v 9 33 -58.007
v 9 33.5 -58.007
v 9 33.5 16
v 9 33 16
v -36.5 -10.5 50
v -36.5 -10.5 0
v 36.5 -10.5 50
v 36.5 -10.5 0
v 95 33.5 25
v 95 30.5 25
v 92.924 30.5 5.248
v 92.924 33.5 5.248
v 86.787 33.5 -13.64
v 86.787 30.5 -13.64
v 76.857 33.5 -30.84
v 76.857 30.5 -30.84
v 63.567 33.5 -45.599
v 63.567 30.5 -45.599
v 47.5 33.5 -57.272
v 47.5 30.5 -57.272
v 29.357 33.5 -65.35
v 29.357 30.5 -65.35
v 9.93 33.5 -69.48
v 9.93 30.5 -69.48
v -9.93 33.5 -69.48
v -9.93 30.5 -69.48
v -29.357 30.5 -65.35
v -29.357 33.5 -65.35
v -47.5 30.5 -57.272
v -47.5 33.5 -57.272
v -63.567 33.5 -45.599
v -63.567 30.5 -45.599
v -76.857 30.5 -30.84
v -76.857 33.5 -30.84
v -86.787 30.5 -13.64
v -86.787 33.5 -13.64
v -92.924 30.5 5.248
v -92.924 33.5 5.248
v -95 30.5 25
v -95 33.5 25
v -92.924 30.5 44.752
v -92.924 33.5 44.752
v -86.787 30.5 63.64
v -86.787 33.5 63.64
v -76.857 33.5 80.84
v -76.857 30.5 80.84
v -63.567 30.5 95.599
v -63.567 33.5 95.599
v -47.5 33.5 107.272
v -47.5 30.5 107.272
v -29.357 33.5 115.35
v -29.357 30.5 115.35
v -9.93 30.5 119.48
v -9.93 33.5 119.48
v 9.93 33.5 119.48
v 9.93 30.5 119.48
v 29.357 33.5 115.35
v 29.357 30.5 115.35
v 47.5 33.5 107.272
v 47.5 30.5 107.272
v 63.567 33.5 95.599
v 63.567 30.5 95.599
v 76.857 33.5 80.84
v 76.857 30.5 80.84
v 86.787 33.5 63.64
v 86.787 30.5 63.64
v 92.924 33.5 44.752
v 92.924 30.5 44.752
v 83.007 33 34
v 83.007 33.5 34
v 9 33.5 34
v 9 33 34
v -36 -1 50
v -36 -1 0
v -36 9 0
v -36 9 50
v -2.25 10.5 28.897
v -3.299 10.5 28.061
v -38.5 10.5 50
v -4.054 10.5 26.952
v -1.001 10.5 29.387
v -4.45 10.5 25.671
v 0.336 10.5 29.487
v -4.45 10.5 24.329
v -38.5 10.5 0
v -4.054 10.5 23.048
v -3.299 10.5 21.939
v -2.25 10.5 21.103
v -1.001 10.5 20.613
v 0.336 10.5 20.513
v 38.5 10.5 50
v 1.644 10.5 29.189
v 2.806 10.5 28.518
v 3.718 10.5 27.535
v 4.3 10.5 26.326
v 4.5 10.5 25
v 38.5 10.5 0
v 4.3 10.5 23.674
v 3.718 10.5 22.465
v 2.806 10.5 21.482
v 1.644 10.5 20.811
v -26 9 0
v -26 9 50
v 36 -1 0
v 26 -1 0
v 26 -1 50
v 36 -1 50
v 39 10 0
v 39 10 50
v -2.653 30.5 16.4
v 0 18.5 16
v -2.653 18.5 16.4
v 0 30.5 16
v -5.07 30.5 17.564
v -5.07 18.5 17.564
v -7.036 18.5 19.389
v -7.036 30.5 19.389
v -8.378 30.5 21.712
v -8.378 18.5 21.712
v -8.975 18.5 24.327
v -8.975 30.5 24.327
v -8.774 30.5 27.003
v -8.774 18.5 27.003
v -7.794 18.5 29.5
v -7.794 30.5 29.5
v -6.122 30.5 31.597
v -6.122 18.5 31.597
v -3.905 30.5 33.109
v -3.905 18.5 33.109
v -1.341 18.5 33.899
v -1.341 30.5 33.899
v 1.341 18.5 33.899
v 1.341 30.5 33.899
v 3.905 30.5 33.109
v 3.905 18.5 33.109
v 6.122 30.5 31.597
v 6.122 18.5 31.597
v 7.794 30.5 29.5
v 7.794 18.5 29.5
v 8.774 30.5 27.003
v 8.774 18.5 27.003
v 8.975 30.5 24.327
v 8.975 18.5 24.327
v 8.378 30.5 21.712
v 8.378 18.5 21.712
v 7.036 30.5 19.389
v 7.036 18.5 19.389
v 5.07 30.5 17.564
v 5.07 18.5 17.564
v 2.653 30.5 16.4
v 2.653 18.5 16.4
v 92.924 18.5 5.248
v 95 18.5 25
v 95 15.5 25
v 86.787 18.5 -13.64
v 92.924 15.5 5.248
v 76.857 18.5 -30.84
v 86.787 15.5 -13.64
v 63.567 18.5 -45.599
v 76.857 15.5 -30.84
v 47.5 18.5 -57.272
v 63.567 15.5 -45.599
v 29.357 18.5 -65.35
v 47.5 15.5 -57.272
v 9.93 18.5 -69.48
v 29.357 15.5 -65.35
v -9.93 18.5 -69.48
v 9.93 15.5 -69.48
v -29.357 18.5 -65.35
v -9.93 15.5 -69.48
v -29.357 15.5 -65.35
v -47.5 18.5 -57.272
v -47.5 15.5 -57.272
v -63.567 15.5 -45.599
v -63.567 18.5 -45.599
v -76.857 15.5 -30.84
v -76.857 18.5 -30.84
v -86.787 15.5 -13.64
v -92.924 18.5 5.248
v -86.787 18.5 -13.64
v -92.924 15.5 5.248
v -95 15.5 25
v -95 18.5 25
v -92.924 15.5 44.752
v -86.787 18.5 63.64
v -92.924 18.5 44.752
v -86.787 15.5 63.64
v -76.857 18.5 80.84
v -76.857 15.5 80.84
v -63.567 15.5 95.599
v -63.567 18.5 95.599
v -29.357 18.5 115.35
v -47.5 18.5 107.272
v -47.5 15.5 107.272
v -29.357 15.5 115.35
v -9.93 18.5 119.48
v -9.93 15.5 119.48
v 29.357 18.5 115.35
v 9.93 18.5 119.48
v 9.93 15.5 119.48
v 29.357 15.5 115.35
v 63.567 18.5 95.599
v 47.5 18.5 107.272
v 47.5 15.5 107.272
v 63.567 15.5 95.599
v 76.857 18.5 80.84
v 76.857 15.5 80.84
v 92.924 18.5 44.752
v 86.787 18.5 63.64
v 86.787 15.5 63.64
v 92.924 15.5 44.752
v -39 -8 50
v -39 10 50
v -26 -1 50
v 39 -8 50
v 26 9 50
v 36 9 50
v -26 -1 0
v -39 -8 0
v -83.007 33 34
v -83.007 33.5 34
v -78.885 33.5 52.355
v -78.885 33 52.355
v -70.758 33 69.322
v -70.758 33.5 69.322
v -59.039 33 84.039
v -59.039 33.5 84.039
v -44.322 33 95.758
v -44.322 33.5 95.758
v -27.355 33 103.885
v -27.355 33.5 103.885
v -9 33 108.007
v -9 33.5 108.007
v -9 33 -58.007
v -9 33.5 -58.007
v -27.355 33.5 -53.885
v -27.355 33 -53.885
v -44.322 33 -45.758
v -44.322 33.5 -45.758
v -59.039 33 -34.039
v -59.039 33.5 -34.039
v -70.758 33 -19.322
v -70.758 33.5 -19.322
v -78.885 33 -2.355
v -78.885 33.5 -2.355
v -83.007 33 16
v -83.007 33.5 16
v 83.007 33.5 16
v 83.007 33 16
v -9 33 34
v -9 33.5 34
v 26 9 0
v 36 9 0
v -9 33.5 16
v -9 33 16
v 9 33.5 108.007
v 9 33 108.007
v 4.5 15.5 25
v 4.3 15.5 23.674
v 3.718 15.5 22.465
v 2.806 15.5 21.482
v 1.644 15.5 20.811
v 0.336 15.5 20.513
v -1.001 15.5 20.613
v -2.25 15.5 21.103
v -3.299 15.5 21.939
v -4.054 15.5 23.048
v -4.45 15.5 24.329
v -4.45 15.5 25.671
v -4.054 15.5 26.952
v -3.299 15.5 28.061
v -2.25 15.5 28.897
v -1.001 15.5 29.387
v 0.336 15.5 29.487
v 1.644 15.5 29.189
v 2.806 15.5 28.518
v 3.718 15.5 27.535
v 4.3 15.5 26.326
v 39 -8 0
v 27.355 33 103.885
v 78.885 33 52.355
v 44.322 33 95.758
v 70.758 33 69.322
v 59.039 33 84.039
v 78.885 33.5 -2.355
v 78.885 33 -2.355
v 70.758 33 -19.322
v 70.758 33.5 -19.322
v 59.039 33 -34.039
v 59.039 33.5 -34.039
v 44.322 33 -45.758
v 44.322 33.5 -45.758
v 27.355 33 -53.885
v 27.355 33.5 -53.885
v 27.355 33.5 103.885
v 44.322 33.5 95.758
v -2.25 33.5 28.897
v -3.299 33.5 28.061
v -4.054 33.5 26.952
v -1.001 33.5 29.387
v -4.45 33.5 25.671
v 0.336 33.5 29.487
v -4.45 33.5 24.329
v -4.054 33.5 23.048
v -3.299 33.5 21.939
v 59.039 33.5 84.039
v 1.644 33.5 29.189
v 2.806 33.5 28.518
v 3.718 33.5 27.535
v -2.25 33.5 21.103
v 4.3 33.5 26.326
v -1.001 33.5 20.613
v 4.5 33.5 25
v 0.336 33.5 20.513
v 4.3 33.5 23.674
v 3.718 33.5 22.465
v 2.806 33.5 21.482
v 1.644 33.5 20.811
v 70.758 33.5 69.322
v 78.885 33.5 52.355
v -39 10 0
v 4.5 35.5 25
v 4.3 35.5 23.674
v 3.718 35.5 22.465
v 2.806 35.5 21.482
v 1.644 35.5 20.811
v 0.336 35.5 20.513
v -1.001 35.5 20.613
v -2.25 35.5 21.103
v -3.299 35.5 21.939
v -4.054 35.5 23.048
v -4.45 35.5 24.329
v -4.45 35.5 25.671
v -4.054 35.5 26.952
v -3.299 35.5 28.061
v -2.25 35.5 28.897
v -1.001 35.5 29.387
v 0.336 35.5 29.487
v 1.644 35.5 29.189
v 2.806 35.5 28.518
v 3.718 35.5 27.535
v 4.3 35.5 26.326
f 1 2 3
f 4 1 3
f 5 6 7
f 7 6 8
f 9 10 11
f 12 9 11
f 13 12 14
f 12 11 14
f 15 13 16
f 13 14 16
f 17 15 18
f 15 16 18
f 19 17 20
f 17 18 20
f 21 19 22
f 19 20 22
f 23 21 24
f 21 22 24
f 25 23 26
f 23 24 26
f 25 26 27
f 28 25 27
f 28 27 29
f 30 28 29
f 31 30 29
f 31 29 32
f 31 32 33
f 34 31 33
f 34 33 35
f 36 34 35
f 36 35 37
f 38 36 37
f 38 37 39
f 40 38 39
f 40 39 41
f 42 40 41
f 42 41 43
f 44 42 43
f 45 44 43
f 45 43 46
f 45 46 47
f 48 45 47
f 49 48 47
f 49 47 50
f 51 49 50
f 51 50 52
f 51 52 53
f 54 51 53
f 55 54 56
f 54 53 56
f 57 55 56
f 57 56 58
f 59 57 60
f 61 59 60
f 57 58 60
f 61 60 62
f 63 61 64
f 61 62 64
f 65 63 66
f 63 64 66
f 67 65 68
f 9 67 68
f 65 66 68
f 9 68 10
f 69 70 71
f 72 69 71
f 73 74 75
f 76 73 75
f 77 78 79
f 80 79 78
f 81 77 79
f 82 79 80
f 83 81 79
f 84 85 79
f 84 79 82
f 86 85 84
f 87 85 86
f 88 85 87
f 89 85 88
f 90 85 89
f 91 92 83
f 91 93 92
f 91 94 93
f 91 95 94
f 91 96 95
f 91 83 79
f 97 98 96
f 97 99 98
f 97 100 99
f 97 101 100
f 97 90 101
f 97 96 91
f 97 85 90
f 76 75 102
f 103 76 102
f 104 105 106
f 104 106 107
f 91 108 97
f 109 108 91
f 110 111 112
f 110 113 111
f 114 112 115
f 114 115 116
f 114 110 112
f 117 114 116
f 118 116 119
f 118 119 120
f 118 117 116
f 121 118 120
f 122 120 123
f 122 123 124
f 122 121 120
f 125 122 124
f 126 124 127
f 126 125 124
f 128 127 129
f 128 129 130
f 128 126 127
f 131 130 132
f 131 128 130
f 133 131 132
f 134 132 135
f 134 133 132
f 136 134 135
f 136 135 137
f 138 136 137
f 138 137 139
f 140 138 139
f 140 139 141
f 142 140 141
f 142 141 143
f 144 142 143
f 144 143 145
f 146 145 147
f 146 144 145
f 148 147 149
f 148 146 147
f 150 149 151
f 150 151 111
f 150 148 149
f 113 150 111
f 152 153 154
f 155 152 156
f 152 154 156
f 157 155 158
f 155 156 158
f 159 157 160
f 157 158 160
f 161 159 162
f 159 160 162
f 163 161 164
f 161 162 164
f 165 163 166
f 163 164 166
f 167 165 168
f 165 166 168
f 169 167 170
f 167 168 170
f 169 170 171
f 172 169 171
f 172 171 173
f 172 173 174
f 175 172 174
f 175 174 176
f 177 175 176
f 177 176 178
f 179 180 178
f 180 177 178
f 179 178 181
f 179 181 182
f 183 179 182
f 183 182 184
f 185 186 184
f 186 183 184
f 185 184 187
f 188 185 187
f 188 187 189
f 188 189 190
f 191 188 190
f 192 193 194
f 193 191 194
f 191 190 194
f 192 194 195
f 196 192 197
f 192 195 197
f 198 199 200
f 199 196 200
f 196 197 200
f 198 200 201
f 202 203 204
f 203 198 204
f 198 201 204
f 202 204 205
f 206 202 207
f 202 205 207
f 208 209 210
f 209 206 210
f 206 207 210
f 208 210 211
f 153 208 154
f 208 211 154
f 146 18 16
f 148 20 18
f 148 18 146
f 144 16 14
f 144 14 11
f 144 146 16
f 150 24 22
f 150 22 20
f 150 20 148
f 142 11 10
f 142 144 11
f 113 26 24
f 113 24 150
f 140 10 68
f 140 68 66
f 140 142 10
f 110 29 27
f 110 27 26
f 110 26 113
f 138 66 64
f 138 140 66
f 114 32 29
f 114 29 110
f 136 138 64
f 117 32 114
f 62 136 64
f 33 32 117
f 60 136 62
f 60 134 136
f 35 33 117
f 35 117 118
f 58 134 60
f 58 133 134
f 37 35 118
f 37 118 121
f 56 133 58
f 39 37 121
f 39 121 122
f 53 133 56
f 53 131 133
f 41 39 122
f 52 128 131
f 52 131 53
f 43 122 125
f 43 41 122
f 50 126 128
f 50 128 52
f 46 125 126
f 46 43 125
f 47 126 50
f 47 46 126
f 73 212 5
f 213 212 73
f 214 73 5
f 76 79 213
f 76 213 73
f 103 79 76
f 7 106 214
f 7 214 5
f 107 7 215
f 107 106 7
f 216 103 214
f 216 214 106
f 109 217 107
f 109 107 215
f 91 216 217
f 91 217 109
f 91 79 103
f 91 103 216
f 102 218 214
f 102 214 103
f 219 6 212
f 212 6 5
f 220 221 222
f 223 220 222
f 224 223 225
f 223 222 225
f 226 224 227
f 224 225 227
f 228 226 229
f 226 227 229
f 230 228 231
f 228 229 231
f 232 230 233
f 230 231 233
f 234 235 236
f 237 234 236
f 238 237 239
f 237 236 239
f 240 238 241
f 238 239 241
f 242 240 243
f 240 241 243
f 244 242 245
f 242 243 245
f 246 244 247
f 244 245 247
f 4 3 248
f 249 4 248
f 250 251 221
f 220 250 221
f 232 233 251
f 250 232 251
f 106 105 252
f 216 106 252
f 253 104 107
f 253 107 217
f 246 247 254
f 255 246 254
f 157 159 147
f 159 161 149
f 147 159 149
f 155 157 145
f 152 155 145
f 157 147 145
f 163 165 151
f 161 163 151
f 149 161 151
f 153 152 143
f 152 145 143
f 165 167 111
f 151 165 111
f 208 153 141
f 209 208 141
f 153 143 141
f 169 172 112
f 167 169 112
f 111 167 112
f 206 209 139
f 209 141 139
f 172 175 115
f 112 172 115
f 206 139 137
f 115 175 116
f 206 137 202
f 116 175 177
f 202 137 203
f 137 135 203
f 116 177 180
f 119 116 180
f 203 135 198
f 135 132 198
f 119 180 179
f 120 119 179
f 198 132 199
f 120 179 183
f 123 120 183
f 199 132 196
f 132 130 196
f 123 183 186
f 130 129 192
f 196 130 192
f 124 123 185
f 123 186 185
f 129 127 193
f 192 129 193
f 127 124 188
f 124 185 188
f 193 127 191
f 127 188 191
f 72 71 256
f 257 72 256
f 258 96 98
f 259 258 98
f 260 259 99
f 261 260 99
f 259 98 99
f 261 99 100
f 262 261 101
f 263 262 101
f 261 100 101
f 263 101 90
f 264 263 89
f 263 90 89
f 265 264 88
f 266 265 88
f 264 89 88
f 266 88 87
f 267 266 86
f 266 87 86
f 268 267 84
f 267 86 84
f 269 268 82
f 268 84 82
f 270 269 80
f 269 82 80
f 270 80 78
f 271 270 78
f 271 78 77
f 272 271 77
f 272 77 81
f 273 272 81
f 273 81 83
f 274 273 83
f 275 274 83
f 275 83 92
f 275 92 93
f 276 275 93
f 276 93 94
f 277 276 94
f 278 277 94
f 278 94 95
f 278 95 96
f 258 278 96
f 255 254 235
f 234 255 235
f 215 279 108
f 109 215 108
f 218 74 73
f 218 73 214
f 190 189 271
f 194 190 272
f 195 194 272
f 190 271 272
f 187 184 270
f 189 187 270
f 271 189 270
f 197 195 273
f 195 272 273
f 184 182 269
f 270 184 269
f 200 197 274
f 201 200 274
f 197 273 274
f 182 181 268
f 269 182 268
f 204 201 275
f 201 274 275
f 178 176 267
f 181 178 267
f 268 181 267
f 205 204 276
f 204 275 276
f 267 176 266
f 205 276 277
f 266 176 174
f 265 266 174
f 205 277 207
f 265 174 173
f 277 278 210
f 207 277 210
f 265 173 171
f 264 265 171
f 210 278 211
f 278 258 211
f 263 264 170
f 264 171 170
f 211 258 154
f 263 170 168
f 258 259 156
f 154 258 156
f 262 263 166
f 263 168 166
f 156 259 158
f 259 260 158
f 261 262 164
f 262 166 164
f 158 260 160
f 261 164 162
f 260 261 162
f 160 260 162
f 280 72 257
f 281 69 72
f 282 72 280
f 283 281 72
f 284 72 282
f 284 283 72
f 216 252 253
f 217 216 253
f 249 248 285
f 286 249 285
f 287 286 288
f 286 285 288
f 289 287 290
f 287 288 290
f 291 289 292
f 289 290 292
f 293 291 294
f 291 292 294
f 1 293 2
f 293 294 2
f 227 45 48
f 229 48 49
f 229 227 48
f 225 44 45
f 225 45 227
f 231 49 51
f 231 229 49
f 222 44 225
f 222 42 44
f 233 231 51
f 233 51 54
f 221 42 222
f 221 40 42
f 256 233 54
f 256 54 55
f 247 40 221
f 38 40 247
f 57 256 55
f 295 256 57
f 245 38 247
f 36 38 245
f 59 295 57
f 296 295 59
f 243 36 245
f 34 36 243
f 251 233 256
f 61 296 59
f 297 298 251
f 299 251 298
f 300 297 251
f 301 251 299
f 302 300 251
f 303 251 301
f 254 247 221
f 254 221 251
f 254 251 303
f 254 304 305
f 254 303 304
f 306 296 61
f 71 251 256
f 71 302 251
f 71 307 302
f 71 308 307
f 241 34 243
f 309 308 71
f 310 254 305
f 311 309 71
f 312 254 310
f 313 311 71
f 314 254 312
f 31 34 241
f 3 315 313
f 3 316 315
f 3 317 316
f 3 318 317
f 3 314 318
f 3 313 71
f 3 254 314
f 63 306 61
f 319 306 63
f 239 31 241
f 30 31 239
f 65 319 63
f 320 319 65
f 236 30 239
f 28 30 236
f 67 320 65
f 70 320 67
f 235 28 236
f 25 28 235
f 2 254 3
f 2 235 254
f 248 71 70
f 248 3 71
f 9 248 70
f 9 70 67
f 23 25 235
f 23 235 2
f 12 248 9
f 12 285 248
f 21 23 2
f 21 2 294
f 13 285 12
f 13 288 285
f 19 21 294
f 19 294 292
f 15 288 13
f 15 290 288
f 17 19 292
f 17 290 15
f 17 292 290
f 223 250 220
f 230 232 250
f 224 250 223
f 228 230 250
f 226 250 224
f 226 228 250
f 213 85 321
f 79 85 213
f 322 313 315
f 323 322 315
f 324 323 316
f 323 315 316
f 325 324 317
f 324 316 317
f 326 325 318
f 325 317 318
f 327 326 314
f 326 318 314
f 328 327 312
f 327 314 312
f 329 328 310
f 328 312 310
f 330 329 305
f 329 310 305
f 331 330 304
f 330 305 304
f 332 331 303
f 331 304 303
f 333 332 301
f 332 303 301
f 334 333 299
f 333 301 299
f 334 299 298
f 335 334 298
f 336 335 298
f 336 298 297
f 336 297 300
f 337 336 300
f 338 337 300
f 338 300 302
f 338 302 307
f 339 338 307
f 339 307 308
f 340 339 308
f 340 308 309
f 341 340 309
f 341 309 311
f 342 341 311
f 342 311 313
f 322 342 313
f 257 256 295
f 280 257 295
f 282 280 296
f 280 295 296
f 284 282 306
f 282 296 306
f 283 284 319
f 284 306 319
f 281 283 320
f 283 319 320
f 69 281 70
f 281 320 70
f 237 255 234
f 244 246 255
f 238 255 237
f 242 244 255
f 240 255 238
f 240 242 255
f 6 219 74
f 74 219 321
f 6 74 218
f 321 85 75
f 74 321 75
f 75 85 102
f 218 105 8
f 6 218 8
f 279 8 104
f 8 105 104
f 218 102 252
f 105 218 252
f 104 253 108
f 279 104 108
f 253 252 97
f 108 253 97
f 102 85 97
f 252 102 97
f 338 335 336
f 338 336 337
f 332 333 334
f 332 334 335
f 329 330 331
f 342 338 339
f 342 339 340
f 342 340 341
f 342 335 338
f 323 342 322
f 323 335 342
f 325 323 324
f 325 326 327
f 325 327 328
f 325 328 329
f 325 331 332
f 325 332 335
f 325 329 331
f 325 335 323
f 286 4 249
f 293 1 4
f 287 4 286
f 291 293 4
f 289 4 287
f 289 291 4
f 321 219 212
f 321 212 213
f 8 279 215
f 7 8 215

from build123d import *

# Parameters (mm, degrees)
SKETCH2_W           = 78
SKETCH2_H           = 21
SKETCH2_W_2         = 10
SKETCH2_H_2         = 10
BOSS_EXTRUDE1_DEPTH = 50
CHAMFER1_SIZE       = 2.5
CHAMFER2_SIZE       = 0.5
SKETCH3_R           = 4.5
BOSS_EXTRUDE2_DEPTH = 25
BOSS_EXTRUDE3_START = 5
SKETCH4_R           = 95
SKETCH4_R_2         = 4.5
BOSS_EXTRUDE3_DEPTH = 18
SKETCH5_W           = 86
SKETCH5_H           = 12
CUT_EXTRUDE1_DEPTH  = 0.5
CIRPATTERN1_COUNT   = 4


with BuildPart() as part:
    # Sketch2 → Boss-Extrude1 (new body)
    with BuildSketch(Plane.XY):
        Rectangle(SKETCH2_W, SKETCH2_H)
        with Locations((-31, 4)):
            Rectangle(SKETCH2_W_2, SKETCH2_H_2, mode=Mode.SUBTRACT)
        with Locations((31, 4)):
            Rectangle(SKETCH2_W_2, SKETCH2_H_2, mode=Mode.SUBTRACT)
    extrude(amount=BOSS_EXTRUDE1_DEPTH)

    # Chamfer1
    chamfer1_edges = [part.edges().sort_by_distance(p)[0] for p in [
        (39, -10.5, 25),
        (-39, -10.5, 25),
    ]]
    chamfer(chamfer1_edges, length=CHAMFER1_SIZE)

    # Chamfer2
    chamfer2_edges = [part.edges().sort_by_distance(p)[0] for p in [
        (-39, 10.5, 25),
        (39, 10.5, 25),
    ]]
    chamfer(chamfer2_edges, length=CHAMFER2_SIZE)

    # Sketch3 → Boss-Extrude2 (add)
    with BuildSketch(Plane(origin=(0, 10.5, 0), x_dir=(1, 0, 0), z_dir=(0, 1, 0))):
        with Locations((0, -25)):
            Circle(SKETCH3_R)
    extrude(amount=BOSS_EXTRUDE2_DEPTH)

    # Sketch4 → Boss-Extrude3 (add)
    with BuildSketch(Plane(origin=(0, 10.5, 0), x_dir=(1, 0, 0), z_dir=(0, 1, 0)).offset(BOSS_EXTRUDE3_START)):
        with Locations((0, -25)):
            Circle(SKETCH4_R)
        with Locations((0, -25)):
            Circle(SKETCH4_R_2, mode=Mode.SUBTRACT)
    extrude(amount=BOSS_EXTRUDE3_DEPTH)

    # Sketch5 → Cut-Revolve1 (revolve, cut)
    with BuildSketch(Plane(origin=(0, 0, 0), x_dir=(0, 0, -1), z_dir=(1, 0, 0))):
        with Locations((27, 24.5)):
            Rectangle(SKETCH5_W, SKETCH5_H)
    revolve(axis=Axis((0, 10.5, 25), (0, 1, 0)), mode=Mode.SUBTRACT)

    # Sketch6 → Cut-Extrude1 (cut)
    with BuildSketch(Plane(origin=(0, 33.5, 0), x_dir=(1, 0, 0), z_dir=(0, 1, 0))):
        with BuildLine():
            Line((9, 58.006582115), (9, -16))
            Line((9, -16), (83.006582115, -16))
            ThreePointArc((83.006582115, -16), (59.03851571, 34.03851571), (9, 58.006582115))
        make_face()
    cut_extrude1 = extrude(amount=-CUT_EXTRUDE1_DEPTH, mode=Mode.SUBTRACT)

    # CirPattern1: Cut-Extrude1 ×4 about axis
    cirpattern1_axis = Axis((0, 0, 25), (0, 1, 0))
    for i in range(1, CIRPATTERN1_COUNT):
        add(cut_extrude1.rotate(cirpattern1_axis, i * 360 / CIRPATTERN1_COUNT), mode=Mode.SUBTRACT)


solid = part.part
